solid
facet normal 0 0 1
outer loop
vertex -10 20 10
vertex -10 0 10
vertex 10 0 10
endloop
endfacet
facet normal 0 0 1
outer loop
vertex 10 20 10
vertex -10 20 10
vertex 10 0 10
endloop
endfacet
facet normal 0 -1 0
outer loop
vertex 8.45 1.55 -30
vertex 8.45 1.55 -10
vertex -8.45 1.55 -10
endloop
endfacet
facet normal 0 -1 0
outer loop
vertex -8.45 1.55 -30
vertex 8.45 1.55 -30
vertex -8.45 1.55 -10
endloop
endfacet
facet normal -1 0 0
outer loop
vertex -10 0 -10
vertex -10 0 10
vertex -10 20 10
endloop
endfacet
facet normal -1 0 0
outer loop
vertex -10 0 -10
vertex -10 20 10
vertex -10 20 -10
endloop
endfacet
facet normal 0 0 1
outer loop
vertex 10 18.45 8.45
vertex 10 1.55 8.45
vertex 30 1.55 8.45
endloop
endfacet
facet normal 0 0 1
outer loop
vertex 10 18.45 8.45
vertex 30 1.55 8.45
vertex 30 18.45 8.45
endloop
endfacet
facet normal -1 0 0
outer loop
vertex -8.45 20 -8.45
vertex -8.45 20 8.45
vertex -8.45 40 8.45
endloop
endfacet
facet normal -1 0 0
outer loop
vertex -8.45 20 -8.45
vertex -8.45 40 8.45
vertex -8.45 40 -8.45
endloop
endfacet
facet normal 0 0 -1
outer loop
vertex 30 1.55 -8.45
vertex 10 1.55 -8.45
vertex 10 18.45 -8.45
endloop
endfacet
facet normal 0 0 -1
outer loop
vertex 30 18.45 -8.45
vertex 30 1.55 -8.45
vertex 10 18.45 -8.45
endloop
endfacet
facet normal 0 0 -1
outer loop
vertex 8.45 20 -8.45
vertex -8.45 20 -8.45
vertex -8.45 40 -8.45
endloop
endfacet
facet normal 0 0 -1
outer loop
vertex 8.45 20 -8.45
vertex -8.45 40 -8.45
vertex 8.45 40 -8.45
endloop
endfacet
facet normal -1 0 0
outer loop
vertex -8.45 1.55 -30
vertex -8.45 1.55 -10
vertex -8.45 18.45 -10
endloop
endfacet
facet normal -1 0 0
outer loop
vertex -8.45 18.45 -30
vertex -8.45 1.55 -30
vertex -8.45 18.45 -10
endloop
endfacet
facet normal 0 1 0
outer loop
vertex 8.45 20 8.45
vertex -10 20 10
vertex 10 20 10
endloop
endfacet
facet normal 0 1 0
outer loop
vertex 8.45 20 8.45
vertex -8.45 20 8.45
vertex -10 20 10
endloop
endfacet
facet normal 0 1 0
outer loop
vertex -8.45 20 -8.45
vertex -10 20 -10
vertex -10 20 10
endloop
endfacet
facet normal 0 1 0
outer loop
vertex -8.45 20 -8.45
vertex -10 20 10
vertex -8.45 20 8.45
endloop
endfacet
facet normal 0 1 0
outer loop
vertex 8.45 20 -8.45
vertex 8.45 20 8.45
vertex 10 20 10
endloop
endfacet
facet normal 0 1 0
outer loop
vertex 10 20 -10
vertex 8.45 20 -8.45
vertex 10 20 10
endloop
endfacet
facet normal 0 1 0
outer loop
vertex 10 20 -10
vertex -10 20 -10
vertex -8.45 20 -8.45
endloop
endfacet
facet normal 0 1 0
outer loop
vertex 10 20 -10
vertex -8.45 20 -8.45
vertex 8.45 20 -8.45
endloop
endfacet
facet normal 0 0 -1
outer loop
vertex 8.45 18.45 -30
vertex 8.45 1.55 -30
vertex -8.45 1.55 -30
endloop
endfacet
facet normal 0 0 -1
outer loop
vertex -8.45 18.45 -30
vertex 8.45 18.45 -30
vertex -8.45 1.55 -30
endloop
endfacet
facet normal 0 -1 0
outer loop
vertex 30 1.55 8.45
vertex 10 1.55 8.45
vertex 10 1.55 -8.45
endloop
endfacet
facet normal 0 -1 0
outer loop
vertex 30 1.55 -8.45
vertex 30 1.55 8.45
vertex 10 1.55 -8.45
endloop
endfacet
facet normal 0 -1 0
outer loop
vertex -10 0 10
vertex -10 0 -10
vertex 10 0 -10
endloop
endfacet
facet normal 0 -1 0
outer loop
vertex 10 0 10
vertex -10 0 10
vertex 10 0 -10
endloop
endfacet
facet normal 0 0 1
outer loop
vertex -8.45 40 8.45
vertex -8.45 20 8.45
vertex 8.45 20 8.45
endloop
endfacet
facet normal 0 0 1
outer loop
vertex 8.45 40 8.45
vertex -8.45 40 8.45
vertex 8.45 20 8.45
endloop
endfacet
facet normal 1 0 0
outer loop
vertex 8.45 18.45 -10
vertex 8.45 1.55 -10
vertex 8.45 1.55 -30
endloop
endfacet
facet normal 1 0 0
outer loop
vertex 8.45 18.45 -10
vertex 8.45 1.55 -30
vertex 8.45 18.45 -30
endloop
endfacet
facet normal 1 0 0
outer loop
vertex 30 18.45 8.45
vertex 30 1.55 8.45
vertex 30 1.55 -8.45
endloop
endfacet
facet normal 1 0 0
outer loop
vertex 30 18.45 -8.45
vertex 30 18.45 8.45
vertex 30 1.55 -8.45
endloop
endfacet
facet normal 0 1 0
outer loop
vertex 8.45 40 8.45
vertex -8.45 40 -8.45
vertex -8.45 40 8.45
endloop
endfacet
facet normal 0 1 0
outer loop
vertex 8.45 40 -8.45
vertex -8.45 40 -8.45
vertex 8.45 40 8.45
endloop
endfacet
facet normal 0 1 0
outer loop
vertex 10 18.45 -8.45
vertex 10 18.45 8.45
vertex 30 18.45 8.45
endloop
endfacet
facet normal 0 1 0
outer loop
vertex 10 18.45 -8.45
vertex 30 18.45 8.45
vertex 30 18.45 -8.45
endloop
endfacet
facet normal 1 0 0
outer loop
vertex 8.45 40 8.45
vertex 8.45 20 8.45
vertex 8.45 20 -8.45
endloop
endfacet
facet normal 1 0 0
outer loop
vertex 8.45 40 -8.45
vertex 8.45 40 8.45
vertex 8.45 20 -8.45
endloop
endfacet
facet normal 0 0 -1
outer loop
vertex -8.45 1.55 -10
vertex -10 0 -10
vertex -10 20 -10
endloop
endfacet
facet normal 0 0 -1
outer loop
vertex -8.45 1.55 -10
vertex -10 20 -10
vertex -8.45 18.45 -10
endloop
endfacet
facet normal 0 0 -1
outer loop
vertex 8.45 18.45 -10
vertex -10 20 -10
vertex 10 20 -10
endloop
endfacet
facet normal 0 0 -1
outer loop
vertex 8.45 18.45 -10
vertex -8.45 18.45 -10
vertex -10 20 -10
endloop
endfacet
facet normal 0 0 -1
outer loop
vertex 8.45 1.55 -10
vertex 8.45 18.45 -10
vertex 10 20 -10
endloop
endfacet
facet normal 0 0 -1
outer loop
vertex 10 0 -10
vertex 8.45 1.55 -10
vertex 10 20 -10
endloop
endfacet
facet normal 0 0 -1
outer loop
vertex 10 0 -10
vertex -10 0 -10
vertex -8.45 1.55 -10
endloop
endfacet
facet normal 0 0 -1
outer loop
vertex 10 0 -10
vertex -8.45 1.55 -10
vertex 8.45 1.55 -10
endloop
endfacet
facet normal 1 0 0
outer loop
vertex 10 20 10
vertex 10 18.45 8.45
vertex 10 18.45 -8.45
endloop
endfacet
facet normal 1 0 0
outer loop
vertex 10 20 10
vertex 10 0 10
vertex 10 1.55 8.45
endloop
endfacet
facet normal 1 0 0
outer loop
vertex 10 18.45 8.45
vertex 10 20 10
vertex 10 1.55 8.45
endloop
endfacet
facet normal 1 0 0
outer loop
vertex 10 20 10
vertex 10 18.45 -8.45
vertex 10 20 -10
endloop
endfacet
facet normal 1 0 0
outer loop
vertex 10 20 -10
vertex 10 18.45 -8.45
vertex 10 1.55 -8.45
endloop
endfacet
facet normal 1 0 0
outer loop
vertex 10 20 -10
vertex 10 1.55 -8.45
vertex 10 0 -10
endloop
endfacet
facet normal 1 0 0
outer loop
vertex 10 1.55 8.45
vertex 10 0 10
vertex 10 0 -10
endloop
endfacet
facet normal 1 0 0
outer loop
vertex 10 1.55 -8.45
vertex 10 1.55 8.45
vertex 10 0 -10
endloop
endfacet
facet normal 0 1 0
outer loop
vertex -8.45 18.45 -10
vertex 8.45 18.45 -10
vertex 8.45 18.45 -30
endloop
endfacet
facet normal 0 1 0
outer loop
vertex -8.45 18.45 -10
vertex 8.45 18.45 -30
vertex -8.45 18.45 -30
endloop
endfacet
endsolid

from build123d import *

# Parameters (mm, degrees)
SKETCH1_W           = 20
SKETCH1_H           = 20
BOSS_EXTRUDE1_DEPTH = 20
SKETCH2_W           = 16.9
SKETCH2_H           = 16.9
BOSS_EXTRUDE2_DEPTH = 20
SKETCH3_W           = 16.9
SKETCH3_H           = 16.9
BOSS_EXTRUDE3_DEPTH = 20
SKETCH4_W           = 16.9
SKETCH4_H           = 16.9
BOSS_EXTRUDE4_DEPTH = 20


with BuildPart() as part:
    # Sketch1 → Boss-Extrude1 (new body)
    with BuildSketch(Plane(origin=(0, 0, 0), x_dir=(1, 0, 0), z_dir=(0, 1, 0))):
        Rectangle(SKETCH1_W, SKETCH1_H)
    extrude(amount=BOSS_EXTRUDE1_DEPTH)

    # Sketch2 → Boss-Extrude2 (add)
    with BuildSketch(Plane(origin=(0, 20, 0), x_dir=(1, 0, 0), z_dir=(0, 1, 0))):
        Rectangle(SKETCH2_W, SKETCH2_H)
    extrude(amount=BOSS_EXTRUDE2_DEPTH)

    # Sketch3 → Boss-Extrude3 (add)
    with BuildSketch(Plane(origin=(10, 0, 0), x_dir=(0, 0, -1), z_dir=(1, 0, 0))):
        with Locations((0, 10)):
            Rectangle(SKETCH3_W, SKETCH3_H)
    extrude(amount=BOSS_EXTRUDE3_DEPTH)

    # Sketch4 → Boss-Extrude4 (add)
    with BuildSketch(Plane(origin=(0, 0, -10), x_dir=(-1, 0, 0), z_dir=(0, 0, -1))):
        with Locations((0, 10)):
            Rectangle(SKETCH4_W, SKETCH4_H)
    extrude(amount=BOSS_EXTRUDE4_DEPTH)


solid = part.part
